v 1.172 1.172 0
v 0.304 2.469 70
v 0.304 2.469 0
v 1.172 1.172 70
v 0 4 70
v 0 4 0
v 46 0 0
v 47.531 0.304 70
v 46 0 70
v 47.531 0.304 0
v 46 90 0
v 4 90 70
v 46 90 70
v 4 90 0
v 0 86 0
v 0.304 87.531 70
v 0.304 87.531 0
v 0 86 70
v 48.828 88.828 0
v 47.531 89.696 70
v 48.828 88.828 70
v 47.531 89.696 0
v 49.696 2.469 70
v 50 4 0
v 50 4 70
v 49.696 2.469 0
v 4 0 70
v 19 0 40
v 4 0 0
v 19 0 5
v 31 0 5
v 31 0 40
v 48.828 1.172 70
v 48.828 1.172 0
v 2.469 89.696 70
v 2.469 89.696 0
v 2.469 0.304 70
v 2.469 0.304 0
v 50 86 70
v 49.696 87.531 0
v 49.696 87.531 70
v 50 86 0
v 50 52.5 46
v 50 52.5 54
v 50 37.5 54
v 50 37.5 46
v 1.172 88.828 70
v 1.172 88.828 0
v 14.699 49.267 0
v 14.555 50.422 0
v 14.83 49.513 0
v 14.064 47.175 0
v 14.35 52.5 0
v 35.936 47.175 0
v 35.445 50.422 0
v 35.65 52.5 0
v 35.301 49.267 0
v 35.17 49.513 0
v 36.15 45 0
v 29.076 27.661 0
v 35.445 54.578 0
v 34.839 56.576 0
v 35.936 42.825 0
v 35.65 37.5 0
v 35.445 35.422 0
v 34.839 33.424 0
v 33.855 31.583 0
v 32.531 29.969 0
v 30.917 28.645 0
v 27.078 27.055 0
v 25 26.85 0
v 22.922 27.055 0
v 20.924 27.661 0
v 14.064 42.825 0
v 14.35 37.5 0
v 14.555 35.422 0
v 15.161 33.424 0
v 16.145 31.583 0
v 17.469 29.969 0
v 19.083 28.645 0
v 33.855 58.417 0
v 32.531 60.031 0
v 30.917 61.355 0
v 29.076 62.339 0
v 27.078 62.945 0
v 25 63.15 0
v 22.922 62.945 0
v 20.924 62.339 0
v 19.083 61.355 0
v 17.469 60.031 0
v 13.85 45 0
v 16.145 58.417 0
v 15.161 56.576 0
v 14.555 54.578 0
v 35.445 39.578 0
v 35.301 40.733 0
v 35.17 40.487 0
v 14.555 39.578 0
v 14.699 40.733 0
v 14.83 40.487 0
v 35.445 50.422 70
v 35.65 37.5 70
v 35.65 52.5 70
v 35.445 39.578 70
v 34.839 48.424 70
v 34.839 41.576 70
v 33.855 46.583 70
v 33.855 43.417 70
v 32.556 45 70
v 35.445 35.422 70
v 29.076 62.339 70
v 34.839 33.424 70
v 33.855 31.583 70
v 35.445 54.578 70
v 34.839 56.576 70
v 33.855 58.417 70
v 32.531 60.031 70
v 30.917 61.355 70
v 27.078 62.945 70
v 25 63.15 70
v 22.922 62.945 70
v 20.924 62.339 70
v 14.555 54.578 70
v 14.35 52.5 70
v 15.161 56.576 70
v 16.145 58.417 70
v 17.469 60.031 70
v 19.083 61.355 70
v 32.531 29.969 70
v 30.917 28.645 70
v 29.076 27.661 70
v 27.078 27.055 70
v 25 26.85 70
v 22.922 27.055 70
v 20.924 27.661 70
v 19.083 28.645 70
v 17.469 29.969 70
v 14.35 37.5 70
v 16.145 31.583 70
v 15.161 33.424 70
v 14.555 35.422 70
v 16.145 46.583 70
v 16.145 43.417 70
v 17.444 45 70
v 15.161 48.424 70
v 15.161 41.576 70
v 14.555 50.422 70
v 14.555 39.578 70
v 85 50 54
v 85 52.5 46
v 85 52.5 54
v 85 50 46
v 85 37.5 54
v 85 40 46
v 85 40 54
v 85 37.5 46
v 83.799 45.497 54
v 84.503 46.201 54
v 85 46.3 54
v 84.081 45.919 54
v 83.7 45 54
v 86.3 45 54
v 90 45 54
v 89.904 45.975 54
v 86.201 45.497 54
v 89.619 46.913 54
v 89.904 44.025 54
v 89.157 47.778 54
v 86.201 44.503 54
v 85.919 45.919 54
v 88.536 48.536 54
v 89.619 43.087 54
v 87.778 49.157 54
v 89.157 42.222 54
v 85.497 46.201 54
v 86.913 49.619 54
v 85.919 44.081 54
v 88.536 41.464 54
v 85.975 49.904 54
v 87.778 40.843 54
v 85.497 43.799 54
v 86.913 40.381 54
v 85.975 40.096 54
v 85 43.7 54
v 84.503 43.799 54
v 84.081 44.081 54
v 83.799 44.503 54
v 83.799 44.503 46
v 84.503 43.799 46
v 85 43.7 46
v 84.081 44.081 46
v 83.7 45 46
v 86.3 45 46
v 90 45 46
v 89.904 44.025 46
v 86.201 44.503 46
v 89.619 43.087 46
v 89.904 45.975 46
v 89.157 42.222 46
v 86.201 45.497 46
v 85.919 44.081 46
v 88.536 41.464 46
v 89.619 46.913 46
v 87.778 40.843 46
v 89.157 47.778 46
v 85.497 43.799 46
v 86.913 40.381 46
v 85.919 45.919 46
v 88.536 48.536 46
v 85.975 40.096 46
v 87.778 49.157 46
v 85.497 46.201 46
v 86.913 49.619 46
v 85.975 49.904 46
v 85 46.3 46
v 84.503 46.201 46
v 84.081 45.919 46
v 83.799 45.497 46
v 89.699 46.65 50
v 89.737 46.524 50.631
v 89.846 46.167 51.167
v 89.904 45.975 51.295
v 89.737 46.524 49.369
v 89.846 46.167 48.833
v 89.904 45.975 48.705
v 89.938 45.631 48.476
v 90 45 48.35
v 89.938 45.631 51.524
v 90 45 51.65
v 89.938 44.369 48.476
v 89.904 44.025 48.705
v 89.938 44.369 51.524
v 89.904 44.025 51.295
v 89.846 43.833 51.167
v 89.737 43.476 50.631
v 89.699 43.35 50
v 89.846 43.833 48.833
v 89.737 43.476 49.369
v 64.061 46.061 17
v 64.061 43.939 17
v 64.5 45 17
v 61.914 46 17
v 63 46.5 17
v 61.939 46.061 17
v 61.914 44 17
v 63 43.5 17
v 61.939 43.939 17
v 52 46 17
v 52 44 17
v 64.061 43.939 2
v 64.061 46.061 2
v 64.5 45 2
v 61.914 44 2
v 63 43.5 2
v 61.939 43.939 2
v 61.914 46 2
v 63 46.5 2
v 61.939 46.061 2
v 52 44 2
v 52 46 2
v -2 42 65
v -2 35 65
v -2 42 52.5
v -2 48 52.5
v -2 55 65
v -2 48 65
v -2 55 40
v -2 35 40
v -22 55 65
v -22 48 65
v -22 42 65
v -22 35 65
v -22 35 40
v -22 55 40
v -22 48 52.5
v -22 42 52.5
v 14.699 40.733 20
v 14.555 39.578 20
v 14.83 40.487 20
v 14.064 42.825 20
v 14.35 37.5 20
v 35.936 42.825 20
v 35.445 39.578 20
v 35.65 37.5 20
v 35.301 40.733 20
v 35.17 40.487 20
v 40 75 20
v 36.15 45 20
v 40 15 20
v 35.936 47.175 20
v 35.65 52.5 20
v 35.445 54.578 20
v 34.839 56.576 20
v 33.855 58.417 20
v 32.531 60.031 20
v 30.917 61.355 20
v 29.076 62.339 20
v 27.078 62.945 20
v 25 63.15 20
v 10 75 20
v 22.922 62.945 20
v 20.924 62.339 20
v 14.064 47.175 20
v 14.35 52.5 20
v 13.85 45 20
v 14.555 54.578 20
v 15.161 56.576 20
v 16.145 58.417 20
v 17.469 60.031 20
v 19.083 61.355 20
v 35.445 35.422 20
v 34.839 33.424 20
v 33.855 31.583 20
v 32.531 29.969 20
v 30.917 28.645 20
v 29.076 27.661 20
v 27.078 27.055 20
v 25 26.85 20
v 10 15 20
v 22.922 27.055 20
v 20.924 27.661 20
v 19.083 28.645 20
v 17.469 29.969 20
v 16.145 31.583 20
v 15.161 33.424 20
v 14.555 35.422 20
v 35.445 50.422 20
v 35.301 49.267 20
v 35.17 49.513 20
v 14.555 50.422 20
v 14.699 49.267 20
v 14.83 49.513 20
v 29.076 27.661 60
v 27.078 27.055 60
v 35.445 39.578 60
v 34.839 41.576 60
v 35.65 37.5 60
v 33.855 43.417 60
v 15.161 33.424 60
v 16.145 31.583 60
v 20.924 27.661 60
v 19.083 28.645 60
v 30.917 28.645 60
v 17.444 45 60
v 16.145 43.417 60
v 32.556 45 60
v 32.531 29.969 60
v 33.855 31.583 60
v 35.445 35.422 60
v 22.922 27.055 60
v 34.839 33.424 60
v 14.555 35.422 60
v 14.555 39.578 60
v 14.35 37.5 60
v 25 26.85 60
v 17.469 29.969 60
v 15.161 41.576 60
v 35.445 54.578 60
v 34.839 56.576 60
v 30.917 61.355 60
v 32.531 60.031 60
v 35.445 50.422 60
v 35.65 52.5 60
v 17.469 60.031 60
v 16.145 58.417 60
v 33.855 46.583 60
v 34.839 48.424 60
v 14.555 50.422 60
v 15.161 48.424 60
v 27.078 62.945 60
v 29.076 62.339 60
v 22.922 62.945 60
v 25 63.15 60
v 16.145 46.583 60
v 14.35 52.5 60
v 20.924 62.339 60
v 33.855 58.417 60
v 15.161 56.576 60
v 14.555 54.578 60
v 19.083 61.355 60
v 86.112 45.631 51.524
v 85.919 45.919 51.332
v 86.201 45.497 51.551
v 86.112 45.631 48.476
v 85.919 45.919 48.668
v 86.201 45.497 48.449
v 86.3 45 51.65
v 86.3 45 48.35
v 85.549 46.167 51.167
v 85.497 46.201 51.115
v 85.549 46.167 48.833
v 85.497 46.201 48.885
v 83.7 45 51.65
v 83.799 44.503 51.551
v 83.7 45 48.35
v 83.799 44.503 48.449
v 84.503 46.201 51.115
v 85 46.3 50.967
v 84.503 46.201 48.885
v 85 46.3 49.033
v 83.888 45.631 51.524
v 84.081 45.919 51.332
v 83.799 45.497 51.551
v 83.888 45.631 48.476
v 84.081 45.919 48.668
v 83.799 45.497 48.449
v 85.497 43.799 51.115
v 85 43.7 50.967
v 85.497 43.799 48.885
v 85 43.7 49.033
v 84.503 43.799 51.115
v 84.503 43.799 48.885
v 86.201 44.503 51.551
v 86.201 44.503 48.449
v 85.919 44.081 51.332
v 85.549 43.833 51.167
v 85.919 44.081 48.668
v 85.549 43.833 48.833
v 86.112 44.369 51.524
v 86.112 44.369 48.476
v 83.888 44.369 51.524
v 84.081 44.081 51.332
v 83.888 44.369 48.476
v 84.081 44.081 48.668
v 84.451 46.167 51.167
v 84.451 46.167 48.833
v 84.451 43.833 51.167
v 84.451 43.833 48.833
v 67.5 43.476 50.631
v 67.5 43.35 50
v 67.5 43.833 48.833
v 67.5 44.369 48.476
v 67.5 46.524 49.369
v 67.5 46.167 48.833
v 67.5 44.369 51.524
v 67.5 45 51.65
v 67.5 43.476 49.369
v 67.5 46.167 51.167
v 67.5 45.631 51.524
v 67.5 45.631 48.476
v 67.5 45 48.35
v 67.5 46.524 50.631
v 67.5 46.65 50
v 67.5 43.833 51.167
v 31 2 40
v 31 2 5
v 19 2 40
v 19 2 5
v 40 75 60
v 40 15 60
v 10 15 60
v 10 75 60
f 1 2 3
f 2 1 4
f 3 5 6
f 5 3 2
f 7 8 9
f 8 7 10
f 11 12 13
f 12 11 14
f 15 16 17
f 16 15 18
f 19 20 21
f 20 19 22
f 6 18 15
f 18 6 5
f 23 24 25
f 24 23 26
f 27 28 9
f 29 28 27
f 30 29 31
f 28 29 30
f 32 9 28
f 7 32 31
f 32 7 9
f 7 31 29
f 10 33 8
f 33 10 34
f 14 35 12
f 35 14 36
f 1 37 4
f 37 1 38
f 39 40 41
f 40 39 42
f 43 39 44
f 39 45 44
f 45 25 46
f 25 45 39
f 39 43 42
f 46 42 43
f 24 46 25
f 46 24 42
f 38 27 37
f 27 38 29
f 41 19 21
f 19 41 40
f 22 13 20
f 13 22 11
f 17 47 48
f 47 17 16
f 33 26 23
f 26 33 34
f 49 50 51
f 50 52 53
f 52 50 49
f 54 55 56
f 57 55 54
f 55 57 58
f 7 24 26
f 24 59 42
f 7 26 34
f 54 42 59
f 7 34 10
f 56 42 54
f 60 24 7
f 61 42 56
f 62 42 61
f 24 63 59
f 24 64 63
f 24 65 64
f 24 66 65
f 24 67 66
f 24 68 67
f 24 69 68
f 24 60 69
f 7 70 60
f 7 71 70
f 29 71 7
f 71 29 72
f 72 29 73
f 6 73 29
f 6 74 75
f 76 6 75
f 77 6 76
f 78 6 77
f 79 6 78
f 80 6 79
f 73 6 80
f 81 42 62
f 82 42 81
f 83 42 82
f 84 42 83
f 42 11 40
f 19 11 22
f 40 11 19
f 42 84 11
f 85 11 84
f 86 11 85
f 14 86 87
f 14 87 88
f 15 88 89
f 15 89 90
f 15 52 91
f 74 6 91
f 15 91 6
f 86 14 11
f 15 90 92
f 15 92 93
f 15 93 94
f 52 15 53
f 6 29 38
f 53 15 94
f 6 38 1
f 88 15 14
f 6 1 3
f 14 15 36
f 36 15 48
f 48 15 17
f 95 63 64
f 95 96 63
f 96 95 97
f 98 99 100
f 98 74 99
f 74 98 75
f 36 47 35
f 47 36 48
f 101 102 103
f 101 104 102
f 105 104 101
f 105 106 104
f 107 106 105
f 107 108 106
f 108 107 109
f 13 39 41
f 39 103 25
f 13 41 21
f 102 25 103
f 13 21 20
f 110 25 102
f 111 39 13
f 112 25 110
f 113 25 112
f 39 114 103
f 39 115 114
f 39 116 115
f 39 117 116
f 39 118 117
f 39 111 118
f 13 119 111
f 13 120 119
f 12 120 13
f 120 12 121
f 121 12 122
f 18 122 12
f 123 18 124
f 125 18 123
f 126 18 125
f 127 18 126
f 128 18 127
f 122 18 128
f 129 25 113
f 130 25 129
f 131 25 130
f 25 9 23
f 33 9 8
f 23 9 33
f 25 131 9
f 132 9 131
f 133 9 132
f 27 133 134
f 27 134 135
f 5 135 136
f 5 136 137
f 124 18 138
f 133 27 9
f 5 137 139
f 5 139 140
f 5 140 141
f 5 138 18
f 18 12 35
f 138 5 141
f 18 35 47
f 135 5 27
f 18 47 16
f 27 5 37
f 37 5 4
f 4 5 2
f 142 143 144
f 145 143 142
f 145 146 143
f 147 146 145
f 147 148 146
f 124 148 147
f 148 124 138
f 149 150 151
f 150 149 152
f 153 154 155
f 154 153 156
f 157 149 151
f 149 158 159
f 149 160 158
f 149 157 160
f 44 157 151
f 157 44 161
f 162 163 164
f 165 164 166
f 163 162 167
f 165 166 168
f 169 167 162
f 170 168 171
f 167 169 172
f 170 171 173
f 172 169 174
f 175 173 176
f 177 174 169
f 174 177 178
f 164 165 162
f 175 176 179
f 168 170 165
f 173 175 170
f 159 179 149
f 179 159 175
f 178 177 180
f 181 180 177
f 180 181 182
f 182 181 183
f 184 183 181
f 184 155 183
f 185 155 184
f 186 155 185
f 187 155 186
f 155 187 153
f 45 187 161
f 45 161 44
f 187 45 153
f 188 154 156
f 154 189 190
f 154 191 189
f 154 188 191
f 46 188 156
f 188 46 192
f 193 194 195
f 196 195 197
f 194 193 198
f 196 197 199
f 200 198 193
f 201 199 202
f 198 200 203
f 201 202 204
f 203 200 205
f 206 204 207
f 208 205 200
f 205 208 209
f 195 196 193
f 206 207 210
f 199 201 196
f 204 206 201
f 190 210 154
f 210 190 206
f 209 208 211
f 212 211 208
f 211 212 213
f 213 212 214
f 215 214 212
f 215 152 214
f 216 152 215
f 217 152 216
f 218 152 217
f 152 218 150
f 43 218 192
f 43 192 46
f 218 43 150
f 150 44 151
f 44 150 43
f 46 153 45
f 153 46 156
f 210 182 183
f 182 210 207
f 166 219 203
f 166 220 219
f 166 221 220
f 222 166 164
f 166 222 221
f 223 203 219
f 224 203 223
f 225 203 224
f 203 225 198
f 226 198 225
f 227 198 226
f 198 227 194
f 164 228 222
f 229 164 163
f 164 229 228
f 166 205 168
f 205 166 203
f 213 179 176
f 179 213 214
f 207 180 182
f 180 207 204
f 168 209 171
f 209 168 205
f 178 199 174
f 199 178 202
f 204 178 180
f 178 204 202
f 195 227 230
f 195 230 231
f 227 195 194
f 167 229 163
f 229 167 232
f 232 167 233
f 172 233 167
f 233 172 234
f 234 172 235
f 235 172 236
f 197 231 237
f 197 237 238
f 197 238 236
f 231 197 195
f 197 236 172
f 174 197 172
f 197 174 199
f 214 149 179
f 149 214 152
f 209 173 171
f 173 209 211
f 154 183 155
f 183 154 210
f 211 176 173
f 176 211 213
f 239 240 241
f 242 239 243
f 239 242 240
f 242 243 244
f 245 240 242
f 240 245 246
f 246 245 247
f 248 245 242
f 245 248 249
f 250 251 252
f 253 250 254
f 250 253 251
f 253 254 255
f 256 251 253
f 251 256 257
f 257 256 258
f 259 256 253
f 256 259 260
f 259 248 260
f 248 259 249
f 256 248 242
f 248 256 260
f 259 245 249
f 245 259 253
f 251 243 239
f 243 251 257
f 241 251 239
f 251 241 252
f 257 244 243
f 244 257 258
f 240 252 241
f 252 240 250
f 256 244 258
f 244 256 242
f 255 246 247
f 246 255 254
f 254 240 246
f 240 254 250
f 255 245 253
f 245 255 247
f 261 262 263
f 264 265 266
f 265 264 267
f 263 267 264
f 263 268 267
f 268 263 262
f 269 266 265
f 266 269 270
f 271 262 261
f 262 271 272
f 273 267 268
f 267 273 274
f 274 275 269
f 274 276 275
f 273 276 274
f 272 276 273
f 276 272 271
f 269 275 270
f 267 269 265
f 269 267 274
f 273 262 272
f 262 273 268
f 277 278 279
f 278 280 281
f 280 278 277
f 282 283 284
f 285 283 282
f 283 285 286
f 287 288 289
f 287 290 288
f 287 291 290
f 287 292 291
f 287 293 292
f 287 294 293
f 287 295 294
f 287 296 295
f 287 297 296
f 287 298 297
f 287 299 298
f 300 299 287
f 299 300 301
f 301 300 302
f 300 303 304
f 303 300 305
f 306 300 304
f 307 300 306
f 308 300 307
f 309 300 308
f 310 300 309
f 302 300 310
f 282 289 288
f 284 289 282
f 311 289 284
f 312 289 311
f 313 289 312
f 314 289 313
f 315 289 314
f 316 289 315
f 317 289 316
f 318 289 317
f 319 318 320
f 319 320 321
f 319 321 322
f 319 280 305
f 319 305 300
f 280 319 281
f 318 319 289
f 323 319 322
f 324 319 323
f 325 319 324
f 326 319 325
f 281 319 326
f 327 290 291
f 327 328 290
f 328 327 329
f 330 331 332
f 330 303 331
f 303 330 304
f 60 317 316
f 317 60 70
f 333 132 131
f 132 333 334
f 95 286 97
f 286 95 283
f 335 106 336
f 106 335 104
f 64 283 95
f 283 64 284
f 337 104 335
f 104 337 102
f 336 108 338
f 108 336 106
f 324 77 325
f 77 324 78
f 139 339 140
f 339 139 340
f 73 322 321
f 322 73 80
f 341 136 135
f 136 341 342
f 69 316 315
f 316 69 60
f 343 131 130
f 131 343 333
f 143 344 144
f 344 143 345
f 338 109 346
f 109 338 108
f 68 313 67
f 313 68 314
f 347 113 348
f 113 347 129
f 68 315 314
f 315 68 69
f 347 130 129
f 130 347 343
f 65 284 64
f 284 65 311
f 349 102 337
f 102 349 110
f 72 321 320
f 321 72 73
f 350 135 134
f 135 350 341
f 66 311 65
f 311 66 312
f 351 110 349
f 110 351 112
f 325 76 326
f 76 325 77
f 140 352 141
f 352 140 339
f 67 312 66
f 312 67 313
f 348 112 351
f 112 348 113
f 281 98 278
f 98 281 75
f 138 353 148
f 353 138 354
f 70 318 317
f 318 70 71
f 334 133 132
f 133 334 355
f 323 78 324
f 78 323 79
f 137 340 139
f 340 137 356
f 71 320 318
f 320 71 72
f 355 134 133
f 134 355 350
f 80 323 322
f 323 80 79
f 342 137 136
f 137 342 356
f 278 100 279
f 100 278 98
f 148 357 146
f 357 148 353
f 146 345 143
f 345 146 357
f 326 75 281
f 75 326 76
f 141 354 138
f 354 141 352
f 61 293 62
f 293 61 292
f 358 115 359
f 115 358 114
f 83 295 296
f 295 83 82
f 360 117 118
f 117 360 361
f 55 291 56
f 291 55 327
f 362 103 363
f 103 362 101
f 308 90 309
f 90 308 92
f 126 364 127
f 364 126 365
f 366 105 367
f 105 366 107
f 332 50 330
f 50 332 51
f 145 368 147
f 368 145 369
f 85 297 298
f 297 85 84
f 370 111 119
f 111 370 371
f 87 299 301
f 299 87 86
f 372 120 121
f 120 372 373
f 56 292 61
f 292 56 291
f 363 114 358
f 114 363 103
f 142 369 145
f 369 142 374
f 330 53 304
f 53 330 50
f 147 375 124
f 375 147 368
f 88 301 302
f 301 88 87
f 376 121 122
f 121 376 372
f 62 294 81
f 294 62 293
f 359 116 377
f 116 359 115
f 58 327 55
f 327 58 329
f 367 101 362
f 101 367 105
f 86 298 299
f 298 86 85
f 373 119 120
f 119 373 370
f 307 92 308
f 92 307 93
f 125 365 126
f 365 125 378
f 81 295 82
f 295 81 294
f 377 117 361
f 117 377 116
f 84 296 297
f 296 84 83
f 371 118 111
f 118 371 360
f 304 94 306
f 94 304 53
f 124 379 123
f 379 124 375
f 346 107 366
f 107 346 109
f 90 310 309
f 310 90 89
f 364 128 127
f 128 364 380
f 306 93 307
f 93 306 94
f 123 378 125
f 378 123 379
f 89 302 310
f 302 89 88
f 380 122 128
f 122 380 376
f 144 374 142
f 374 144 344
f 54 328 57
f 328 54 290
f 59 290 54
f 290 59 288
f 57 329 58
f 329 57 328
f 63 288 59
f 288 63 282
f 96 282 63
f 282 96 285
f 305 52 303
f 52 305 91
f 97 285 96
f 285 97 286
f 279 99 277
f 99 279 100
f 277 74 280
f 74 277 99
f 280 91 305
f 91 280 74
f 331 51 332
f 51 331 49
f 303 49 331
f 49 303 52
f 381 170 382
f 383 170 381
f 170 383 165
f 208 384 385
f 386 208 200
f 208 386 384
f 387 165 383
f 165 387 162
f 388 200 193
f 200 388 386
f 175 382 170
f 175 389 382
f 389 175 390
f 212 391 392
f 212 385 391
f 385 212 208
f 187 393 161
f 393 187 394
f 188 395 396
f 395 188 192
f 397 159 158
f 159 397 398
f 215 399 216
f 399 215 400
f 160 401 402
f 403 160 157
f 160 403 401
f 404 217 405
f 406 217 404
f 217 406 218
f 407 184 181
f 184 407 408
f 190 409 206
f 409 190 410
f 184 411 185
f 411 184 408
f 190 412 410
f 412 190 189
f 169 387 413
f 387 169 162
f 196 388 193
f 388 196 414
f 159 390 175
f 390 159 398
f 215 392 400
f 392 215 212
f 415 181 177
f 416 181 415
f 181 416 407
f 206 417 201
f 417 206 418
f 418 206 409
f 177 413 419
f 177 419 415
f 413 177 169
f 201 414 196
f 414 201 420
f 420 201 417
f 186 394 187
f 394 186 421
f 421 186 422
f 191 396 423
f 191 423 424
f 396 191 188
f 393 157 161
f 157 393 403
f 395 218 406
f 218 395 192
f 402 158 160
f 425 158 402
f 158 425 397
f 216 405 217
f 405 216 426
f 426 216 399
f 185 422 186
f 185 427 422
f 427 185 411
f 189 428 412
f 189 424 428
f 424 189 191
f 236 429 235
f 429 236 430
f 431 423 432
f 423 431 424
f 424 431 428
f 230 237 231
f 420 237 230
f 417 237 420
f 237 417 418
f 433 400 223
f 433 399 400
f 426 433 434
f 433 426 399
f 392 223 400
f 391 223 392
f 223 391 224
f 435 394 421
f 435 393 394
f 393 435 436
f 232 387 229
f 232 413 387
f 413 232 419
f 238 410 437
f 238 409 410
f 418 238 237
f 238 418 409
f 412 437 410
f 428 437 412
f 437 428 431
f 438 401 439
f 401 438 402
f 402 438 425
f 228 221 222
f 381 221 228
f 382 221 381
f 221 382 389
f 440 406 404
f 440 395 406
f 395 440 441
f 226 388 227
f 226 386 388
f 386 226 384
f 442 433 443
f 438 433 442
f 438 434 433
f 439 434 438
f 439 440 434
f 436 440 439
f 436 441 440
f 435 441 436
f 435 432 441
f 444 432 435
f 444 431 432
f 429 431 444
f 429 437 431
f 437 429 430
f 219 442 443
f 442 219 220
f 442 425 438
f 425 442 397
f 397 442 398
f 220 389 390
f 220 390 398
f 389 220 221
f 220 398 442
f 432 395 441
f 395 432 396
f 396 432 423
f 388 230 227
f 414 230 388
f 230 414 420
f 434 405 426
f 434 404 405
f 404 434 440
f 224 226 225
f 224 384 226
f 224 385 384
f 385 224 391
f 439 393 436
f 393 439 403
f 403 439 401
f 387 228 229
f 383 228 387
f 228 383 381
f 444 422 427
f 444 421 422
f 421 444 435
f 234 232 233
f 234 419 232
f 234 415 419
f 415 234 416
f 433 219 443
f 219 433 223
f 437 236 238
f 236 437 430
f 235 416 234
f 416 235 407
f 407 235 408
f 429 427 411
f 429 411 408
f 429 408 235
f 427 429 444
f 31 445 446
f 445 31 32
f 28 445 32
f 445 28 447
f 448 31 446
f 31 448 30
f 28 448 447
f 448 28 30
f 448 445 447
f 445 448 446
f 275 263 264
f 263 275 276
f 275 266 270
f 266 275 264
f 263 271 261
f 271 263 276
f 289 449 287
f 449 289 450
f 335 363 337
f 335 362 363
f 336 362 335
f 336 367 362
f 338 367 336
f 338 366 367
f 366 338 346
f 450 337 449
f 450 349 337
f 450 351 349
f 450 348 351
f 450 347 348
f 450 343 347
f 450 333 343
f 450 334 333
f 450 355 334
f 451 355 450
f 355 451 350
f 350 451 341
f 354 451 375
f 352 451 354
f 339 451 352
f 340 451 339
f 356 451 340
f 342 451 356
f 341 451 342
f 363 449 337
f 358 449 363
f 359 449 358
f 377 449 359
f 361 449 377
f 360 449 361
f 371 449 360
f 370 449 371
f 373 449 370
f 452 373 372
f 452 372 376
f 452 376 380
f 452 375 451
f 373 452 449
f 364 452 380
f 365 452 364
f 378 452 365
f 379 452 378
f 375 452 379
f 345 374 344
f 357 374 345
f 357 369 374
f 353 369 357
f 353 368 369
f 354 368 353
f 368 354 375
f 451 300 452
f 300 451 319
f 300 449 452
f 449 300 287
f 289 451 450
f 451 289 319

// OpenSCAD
/**
 * wire_guide_carriage.scad — TM-CWND-001 Rev A
 * Wire Guide Traverse Carriage
 *
 * Slides on two 12mm smooth rods (60mm center spacing).
 * Driven by T8 leadscrew (8mm, 2mm pitch).
 * Carries the wire eye that guides wire onto the coil former.
 *
 * Features:
 *   - Anti-backlash T8 nut pocket (spring-loaded split nut or commercial)
 *   - LM12UU linear bearing pockets (or printed PTFE bushings)
 *   - Adjustable wire eye height (±10mm from nominal)
 *   - V-pointer for visual turn position
 *   - Wire optical sensor bracket (for wire break sensor mounting)
 *   - Magnetic position indicator strip slot
 *
 * Print settings:
 *   Material: PETG (good bearing surface against steel rods)
 *   Infill: 60% gyroid
 *   Wall: 4 perimeters
 *   Layer: 0.15mm (bearing bore accuracy)
 *   Supports: Yes under bearing bores
 *
 * Print envelope: 120×100×80mm — fits in 200mm cube
 *
 * Hardware:
 *   LM12UU bearings (4×) — 12mm bore, 21mm OD, 30mm length
 *   OR: printed PTFE bushing inserts (self-lubricated)
 *   T8 anti-backlash nut (commercial) — Tr8×2 or T8×2
 *   Wire guide: 2.5mm bore ceramic eyelet, or print PTFE insert
 *   M3 set screw × 4 (bearing retention)
 */

// ─── Parameters ───────────────────────────────────────────────────────────────

// Rail rod geometry (must match base_plate.scad)
rail_dia        = 12.0;
rail_spacing    = 60.0;  // Center-to-center Y
lm12uu_od       = 21.3;  // LM12UU OD + 0.1mm press clearance
lm12uu_len      = 30.0;  // LM12UU length

// Leadscrew (T8, 2mm pitch)
lead_dia        = 8.4;   // Through bore (anti-backlash nut threads into this)
lead_nut_od     = 22.0;  // Anti-backlash nut OD flange
lead_nut_h      = 20.0;  // Nut height (with spring)
lead_nut_bolt_sp= 12.0;  // Nut flange bolt hole spacing

// Carriage body
body_w          = 90.0;  // Width (Y direction, spans rail centers + margin)
body_d          = 50.0;  // Depth (X direction, along travel)
body_h          = 70.0;  // Height (Z direction)
body_corner     = 4.0;

// Wire guide arm (extends toward coil former)
arm_len         = 35.0;  // Extension toward spindle
arm_w           = 15.0;
arm_h           = 8.0;
arm_z           = 50.0;  // Height of wire guide above base (nominal)

// Wire eye
eye_dia         = 2.6;   // Wire passage (for AWG10 = 2.6mm dia wire)
eye_boss_od     = 10.0;
eye_slot_h      = 20.0;  // Vertical slot for height adjustment

// V-pointer
ptr_len         = 12.0;
ptr_w           = 2.0;
ptr_h           = 15.0;

// Optical sensor bracket (for wire break sensor)
sens_bracket_w  = 20.0;
sens_bracket_h  = 25.0;
sens_gap        = 6.0;   // Gap in bracket for wire to pass (optical slot)
sens_z          = arm_z - 10;  // Height of optical sensor

// Position indicator strip slot
strip_w         = 12.0;  // Magnetic strip width
strip_d         = 2.0;   // Strip thickness
strip_z         = 5.0;   // Height from bottom

// M3 retention screw holes (for bearing retention)
ret_screw_dia   = 3.3;

// Printed bushing (alternative to LM12UU)
bushing_od      = lm12uu_od;
bushing_len     = 20.0;  // Shorter than LM12UU
bushing_wall    = 2.0;

// ─── Modules ──────────────────────────────────────────────────────────────────

module carriage_body() {
    difference() {
        union() {
            // Main body
            hull() {
                for (x=[body_corner, body_d-body_corner])
                for (y=[body_corner, body_w-body_corner])
                    translate([x, y, 0])
                        cylinder(h=body_h, r=body_corner, $fn=16);
            }

            // Wire guide arm (extends in X direction toward spindle)
            translate([body_d, body_w/2 - arm_w/2, arm_z - arm_h/2])
                cube([arm_len, arm_w, arm_h]);

            // Eye boss at end of arm
            translate([body_d + arm_len, body_w/2, arm_z])
                cylinder(h=arm_h, d=eye_boss_od, $fn=32, center=true);

            // V-pointer (visual indicator on front face)
            translate([body_d + 2, body_w/2 - ptr_w/2, 2])
                cube([ptr_len, ptr_w, ptr_h]);
            // V-tip
            translate([body_d + ptr_len + 1, body_w/2, 2])
                cylinder(h=ptr_h, r=1.5, $fn=8);

            // Optical sensor bracket (back of body, extends down)
            translate([-sens_bracket_w - 2, body_w/2 - sens_bracket_w/2, sens_z])
                cube([sens_bracket_w, sens_bracket_w, sens_bracket_h]);
        }

        // Front rail bore (LM12UU or printed bushing)
        translate([body_d/2, rail_spacing/2 + (body_w/2 - rail_spacing/2)/2, -0.5])
            cylinder(h=body_h+1, d=lm12uu_od, $fn=32);
        // Set screw for front bearing
        translate([body_d/2, rail_spacing/2 + (body_w/2 - rail_spacing/2)/2 + lm12uu_od/2 + 1, body_h/2])
        rotate([90,0,0])
            cylinder(h=lm12uu_od+2, d=ret_screw_dia, $fn=16);

        // Rear rail bore
        translate([body_d/2, body_w - (rail_spacing/2 + (body_w/2 - rail_spacing/2)/2), -0.5])
            cylinder(h=body_h+1, d=lm12uu_od, $fn=32);
        translate([body_d/2, body_w - (rail_spacing/2 + (body_w/2 - rail_spacing/2)/2) - lm12uu_od/2 - 1, body_h/2])
        rotate([90,0,0])
            cylinder(h=lm12uu_od+2, d=ret_screw_dia, $fn=16);

        // Leadscrew nut pocket (center bottom)
        translate([body_d/2, body_w/2, -0.5])
            cylinder(h=lead_nut_h+0.5, d=lead_nut_od+0.3, $fn=32);
        // Leadscrew through bore (full height)
        translate([body_d/2, body_w/2, -0.5])
            cylinder(h=body_h+1, d=lead_dia, $fn=32);
        // Anti-backlash nut bolt holes
        for (a=[0,180])
            rotate([0,0,a])
            translate([body_d/2 + lead_nut_bolt_sp/2, body_w/2, -0.5])
                cylinder(h=lead_nut_h+0.5, d=3.3, $fn=16);

        // Wire eye bore (with adjustment slot)
        translate([body_d + arm_len, body_w/2, arm_z - eye_slot_h/2 - 0.5])
            cylinder(h=eye_slot_h+1, d=eye_dia, $fn=16);
        // Height adjustment slot (M3 clamping bolt through arm)
        translate([body_d + arm_len/2, body_w/2, arm_z])
        rotate([0,90,0])
            cylinder(h=arm_len+1, d=3.3, $fn=16);

        // Position strip slot
        translate([body_d/2 - strip_w/2, -0.5, strip_z])
            cube([strip_w, strip_d+0.5, body_h/2]);

        // Optical sensor slot (gap in sensor bracket)
        translate([-sens_bracket_w-3, body_w/2 - sens_gap/2, sens_z + sens_bracket_h/2])
            cube([sens_bracket_w+2, sens_gap, sens_bracket_h/2+1]);

        // Weight relief pockets
        translate([10, 15, 20])
            cube([body_d-20, body_w-30, body_h-30]);
    }
}

module printed_bushing() {
    // PTFE or printed bushing (alternative to LM12UU)
    // Self-lubricating with PTFE filament; print in 0.1mm layers
    difference() {
        cylinder(h=bushing_len, d=bushing_od, $fn=32);
        translate([0,0,-0.5])
            cylinder(h=bushing_len+1, d=rail_dia+0.15, $fn=32);
        // Oil groove (retain small amount of lubricant)
        translate([0, 0, bushing_len/2])
            rotate_extrude($fn=64)
            translate([rail_dia/2 + bushing_wall/2, 0, 0])
                circle(r=0.5, $fn=8);
    }
}

module wire_eye_insert() {
    // Drop-in ceramic-style eye insert
    // Print in PETG, 100% infill, 0.1mm layers for smooth bore
    h = arm_h + 4;
    difference() {
        cylinder(h=h, d=eye_boss_od-0.4, $fn=32);
        // Bore with chamfers
        translate([0,0,-0.5]) cylinder(h=h+1, d=eye_dia, $fn=16);
        translate([0,0,h-1.5]) cylinder(h=2, d1=eye_dia, d2=eye_dia+2, $fn=16);
        translate([0,0,-0.5]) cylinder(h=2, d1=eye_dia+2, d2=eye_dia, $fn=16);
    }
}

// ─── Render ───────────────────────────────────────────────────────────────────

$fn = 32;
print_part = "carriage";  // "carriage" | "bushing" | "eye" | "all"

if (print_part == "carriage") {
    color("lightgray") carriage_body();
} else if (print_part == "bushing") {
    for (i=[0:3])
        translate([i * 25, 0, 0])
            color("lightblue") printed_bushing();
} else if (print_part == "eye") {
    color("white") wire_eye_insert();
} else {
    color("lightgray", 0.8) carriage_body();
    // Show bearings in position
    for (y=[rail_spacing/2 + (90/2 - rail_spacing/2)/2,
            90 - (rail_spacing/2 + (90/2 - rail_spacing/2)/2)])
        color("silver", 0.5)
        translate([45, y, 0])
            cylinder(h=lm12uu_len, d=lm12uu_od-0.3, $fn=32);
}
